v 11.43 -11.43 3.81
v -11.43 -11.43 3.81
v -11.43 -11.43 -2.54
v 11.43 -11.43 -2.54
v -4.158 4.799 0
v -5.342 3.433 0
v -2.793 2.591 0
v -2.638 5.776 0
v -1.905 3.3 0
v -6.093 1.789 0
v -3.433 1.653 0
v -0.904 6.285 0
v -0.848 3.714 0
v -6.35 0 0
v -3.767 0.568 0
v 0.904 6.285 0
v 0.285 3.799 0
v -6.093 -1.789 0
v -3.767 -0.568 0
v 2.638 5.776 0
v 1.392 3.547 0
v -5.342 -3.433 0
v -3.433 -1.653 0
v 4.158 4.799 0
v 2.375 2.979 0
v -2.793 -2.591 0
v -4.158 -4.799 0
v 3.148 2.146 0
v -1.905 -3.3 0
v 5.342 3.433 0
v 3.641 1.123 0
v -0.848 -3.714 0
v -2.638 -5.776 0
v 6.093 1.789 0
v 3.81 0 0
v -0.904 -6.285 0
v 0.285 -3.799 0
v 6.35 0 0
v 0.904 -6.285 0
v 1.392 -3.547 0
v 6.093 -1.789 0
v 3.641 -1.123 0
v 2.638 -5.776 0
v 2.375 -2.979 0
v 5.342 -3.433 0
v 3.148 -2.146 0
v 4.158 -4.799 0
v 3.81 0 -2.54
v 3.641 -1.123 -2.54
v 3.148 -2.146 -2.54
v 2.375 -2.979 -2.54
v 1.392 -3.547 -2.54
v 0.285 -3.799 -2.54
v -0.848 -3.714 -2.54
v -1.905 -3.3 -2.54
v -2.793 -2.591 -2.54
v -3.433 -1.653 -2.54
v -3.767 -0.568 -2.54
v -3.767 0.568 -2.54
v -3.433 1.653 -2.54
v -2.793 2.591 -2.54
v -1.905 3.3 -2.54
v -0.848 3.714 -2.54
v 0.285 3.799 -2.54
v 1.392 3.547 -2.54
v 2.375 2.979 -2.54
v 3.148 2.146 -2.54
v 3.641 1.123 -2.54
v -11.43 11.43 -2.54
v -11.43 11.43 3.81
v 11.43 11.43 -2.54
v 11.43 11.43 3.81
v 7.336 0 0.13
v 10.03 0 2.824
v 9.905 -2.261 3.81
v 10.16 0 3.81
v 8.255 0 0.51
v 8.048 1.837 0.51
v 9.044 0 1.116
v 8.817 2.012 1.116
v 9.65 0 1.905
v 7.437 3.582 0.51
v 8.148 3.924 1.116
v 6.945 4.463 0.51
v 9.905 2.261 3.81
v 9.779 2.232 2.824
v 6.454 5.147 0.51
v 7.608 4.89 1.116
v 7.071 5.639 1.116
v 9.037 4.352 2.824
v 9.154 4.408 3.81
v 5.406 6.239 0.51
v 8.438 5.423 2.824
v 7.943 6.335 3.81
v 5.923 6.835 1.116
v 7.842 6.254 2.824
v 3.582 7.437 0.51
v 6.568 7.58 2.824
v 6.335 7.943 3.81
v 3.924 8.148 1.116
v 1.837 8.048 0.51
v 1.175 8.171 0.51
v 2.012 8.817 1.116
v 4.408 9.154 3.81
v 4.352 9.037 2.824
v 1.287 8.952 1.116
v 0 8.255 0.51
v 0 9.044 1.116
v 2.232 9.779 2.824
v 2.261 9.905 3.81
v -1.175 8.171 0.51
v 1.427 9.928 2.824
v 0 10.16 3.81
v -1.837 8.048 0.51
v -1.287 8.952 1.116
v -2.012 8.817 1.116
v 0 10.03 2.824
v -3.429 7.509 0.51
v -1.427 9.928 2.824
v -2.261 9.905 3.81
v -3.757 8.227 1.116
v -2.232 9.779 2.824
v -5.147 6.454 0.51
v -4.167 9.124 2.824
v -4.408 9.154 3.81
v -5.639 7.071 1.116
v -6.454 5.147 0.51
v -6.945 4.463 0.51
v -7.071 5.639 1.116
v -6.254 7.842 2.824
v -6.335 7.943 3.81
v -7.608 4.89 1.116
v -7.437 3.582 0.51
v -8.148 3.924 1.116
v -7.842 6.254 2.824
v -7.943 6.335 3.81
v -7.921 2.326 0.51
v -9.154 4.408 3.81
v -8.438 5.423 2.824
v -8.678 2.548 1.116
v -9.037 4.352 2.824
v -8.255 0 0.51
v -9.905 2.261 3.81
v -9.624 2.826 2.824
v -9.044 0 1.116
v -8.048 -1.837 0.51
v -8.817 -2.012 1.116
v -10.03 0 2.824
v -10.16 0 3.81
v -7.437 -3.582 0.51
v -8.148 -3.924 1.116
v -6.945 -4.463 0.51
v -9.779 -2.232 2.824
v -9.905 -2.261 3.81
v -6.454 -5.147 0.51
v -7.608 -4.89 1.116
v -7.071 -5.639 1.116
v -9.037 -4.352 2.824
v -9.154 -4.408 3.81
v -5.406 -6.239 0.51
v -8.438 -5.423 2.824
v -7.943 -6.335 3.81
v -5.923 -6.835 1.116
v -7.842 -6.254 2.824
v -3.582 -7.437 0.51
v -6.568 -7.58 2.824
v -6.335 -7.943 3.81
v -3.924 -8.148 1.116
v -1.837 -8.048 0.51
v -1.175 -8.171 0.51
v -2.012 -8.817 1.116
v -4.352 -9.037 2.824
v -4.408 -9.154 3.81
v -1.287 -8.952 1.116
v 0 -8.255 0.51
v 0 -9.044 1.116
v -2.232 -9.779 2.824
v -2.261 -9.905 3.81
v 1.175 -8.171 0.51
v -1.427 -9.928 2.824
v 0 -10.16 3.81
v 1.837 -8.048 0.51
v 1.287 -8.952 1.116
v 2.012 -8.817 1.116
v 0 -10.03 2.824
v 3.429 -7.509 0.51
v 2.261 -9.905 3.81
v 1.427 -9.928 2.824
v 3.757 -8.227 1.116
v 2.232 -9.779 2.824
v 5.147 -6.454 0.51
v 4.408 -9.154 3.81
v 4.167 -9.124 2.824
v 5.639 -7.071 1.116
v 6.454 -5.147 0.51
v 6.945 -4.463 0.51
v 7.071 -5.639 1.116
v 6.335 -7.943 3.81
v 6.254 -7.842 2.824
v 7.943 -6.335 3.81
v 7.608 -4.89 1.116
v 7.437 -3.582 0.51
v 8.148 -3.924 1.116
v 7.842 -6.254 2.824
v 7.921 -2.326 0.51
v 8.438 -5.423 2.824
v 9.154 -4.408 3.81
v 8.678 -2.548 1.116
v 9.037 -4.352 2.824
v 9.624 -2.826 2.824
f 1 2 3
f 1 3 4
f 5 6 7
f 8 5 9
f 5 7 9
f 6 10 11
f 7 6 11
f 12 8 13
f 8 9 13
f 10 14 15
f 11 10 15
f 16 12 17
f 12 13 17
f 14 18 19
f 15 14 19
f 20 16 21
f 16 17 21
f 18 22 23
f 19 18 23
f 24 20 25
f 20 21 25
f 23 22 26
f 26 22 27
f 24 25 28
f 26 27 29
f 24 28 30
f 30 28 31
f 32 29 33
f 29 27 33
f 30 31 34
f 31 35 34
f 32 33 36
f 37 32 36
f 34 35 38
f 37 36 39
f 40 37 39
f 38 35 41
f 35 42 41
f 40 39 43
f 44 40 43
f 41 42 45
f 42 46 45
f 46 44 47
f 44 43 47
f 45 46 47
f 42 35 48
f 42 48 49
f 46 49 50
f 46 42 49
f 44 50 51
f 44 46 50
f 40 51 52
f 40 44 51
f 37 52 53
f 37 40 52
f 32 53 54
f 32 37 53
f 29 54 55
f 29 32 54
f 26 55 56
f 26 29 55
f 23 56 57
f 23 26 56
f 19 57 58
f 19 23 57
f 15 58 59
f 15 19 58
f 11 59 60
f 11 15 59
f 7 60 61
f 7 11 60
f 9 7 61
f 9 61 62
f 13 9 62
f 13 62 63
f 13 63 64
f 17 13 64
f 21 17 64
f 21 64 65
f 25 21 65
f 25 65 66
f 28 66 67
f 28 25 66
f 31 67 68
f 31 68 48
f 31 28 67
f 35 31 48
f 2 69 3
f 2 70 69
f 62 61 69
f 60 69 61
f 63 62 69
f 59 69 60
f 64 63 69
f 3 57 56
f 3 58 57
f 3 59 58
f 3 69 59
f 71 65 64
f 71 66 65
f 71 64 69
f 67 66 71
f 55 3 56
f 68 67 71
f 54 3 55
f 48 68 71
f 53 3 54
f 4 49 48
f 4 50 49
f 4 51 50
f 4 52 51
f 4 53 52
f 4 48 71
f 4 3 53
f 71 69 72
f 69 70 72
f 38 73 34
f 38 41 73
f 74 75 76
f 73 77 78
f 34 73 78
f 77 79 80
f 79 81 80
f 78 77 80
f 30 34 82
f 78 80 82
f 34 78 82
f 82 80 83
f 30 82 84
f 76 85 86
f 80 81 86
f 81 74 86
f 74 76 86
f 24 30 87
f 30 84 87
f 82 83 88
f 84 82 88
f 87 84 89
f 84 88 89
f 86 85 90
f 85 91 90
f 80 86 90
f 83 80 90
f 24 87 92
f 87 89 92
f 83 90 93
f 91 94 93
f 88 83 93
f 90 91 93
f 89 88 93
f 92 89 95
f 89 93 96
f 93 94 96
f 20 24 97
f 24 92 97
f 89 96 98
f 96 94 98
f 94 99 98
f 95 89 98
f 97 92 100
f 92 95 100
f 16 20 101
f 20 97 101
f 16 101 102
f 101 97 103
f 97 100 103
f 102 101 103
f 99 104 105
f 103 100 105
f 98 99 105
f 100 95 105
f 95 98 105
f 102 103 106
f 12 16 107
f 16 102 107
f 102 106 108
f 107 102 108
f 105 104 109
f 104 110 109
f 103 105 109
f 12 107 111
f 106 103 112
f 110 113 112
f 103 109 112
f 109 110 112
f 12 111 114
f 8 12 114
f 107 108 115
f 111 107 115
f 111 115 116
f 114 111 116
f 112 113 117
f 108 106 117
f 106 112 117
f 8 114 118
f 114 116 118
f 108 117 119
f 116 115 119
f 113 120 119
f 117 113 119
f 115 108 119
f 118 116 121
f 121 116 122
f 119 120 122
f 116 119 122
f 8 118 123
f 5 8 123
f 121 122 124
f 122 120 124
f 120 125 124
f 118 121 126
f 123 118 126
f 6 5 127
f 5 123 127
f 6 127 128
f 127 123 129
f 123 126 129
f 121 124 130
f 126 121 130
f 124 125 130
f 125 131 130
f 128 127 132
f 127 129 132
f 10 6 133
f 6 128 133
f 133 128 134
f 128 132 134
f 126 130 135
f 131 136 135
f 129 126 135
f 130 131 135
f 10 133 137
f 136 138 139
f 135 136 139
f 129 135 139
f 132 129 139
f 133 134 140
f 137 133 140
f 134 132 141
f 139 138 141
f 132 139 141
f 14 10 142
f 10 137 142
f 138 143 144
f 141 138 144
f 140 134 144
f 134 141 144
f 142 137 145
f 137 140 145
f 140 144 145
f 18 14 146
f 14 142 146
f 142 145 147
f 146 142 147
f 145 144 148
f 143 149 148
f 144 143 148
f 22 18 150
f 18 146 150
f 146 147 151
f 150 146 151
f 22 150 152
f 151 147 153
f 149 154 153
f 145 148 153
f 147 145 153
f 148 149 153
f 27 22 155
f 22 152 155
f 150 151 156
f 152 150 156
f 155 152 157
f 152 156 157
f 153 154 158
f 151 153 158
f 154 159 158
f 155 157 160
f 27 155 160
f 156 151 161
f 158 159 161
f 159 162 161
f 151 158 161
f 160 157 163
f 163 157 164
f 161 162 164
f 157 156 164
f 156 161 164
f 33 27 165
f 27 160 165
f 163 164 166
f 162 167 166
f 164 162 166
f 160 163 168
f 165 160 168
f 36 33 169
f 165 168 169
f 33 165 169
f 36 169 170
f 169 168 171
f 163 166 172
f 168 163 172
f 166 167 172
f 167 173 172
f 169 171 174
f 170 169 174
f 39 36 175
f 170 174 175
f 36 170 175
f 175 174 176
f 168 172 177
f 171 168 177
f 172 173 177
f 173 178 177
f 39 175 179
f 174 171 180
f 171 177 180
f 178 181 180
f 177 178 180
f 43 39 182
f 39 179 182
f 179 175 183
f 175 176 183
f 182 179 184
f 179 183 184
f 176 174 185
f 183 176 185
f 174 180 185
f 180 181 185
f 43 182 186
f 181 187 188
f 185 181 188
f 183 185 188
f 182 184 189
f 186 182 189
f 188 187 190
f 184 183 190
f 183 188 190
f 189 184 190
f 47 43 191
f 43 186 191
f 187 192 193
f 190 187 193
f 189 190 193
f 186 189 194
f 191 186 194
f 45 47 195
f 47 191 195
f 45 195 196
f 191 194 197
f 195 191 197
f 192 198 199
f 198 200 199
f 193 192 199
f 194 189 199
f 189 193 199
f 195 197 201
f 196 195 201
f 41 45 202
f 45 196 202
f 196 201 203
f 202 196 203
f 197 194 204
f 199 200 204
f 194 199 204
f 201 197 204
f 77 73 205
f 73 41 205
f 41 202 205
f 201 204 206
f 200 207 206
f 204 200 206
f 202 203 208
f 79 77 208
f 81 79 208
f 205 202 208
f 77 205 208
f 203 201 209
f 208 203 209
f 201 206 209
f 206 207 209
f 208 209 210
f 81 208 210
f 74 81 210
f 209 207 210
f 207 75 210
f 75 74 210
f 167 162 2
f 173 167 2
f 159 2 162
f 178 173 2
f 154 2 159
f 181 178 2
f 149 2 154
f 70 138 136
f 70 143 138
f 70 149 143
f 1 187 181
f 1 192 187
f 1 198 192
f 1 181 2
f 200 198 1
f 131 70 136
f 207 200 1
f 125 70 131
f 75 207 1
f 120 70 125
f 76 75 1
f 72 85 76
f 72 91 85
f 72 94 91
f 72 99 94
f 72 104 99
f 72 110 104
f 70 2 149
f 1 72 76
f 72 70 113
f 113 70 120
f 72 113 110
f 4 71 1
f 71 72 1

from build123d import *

# Parameters (mm, degrees)
F0_W     = 22.86
F0_H     = 22.86
F1_DEPTH = 3.81
F4_W     = 22.86
F4_H     = 22.86
F4_R     = 3.81
F5_DEPTH = 2.54


with BuildPart() as f1:
    # F0 (on Top) → F1 (new body)
    with BuildSketch(Plane.XY):
        Rectangle(F0_W, F0_H)
    extrude(amount=F1_DEPTH)

    # F2 (on Front) → F3 (revolve, cut)
    with BuildSketch(Plane.XZ):
        with BuildLine():
            Line((0, 3.81), (0, 0))
            Line((0, 0), (6.35, 0))
            ThreePointArc((6.35, 0), (9.044077, 1.115923), (10.16, 3.81))
            Line((10.16, 3.81), (0, 3.81))
        make_face()
    revolve(axis=Axis((0, 0, 1.905), (0, 0, 1)), mode=Mode.SUBTRACT)

    # F4 (on face) → F5 (join)
    with BuildSketch(Plane(origin=(0, 0, 0), x_dir=(1, 0, 0), z_dir=(0, 0, -1))):
        Rectangle(F4_W, F4_H)
        Circle(F4_R, mode=Mode.SUBTRACT)
    extrude(amount=F5_DEPTH)


solid = f1.part
